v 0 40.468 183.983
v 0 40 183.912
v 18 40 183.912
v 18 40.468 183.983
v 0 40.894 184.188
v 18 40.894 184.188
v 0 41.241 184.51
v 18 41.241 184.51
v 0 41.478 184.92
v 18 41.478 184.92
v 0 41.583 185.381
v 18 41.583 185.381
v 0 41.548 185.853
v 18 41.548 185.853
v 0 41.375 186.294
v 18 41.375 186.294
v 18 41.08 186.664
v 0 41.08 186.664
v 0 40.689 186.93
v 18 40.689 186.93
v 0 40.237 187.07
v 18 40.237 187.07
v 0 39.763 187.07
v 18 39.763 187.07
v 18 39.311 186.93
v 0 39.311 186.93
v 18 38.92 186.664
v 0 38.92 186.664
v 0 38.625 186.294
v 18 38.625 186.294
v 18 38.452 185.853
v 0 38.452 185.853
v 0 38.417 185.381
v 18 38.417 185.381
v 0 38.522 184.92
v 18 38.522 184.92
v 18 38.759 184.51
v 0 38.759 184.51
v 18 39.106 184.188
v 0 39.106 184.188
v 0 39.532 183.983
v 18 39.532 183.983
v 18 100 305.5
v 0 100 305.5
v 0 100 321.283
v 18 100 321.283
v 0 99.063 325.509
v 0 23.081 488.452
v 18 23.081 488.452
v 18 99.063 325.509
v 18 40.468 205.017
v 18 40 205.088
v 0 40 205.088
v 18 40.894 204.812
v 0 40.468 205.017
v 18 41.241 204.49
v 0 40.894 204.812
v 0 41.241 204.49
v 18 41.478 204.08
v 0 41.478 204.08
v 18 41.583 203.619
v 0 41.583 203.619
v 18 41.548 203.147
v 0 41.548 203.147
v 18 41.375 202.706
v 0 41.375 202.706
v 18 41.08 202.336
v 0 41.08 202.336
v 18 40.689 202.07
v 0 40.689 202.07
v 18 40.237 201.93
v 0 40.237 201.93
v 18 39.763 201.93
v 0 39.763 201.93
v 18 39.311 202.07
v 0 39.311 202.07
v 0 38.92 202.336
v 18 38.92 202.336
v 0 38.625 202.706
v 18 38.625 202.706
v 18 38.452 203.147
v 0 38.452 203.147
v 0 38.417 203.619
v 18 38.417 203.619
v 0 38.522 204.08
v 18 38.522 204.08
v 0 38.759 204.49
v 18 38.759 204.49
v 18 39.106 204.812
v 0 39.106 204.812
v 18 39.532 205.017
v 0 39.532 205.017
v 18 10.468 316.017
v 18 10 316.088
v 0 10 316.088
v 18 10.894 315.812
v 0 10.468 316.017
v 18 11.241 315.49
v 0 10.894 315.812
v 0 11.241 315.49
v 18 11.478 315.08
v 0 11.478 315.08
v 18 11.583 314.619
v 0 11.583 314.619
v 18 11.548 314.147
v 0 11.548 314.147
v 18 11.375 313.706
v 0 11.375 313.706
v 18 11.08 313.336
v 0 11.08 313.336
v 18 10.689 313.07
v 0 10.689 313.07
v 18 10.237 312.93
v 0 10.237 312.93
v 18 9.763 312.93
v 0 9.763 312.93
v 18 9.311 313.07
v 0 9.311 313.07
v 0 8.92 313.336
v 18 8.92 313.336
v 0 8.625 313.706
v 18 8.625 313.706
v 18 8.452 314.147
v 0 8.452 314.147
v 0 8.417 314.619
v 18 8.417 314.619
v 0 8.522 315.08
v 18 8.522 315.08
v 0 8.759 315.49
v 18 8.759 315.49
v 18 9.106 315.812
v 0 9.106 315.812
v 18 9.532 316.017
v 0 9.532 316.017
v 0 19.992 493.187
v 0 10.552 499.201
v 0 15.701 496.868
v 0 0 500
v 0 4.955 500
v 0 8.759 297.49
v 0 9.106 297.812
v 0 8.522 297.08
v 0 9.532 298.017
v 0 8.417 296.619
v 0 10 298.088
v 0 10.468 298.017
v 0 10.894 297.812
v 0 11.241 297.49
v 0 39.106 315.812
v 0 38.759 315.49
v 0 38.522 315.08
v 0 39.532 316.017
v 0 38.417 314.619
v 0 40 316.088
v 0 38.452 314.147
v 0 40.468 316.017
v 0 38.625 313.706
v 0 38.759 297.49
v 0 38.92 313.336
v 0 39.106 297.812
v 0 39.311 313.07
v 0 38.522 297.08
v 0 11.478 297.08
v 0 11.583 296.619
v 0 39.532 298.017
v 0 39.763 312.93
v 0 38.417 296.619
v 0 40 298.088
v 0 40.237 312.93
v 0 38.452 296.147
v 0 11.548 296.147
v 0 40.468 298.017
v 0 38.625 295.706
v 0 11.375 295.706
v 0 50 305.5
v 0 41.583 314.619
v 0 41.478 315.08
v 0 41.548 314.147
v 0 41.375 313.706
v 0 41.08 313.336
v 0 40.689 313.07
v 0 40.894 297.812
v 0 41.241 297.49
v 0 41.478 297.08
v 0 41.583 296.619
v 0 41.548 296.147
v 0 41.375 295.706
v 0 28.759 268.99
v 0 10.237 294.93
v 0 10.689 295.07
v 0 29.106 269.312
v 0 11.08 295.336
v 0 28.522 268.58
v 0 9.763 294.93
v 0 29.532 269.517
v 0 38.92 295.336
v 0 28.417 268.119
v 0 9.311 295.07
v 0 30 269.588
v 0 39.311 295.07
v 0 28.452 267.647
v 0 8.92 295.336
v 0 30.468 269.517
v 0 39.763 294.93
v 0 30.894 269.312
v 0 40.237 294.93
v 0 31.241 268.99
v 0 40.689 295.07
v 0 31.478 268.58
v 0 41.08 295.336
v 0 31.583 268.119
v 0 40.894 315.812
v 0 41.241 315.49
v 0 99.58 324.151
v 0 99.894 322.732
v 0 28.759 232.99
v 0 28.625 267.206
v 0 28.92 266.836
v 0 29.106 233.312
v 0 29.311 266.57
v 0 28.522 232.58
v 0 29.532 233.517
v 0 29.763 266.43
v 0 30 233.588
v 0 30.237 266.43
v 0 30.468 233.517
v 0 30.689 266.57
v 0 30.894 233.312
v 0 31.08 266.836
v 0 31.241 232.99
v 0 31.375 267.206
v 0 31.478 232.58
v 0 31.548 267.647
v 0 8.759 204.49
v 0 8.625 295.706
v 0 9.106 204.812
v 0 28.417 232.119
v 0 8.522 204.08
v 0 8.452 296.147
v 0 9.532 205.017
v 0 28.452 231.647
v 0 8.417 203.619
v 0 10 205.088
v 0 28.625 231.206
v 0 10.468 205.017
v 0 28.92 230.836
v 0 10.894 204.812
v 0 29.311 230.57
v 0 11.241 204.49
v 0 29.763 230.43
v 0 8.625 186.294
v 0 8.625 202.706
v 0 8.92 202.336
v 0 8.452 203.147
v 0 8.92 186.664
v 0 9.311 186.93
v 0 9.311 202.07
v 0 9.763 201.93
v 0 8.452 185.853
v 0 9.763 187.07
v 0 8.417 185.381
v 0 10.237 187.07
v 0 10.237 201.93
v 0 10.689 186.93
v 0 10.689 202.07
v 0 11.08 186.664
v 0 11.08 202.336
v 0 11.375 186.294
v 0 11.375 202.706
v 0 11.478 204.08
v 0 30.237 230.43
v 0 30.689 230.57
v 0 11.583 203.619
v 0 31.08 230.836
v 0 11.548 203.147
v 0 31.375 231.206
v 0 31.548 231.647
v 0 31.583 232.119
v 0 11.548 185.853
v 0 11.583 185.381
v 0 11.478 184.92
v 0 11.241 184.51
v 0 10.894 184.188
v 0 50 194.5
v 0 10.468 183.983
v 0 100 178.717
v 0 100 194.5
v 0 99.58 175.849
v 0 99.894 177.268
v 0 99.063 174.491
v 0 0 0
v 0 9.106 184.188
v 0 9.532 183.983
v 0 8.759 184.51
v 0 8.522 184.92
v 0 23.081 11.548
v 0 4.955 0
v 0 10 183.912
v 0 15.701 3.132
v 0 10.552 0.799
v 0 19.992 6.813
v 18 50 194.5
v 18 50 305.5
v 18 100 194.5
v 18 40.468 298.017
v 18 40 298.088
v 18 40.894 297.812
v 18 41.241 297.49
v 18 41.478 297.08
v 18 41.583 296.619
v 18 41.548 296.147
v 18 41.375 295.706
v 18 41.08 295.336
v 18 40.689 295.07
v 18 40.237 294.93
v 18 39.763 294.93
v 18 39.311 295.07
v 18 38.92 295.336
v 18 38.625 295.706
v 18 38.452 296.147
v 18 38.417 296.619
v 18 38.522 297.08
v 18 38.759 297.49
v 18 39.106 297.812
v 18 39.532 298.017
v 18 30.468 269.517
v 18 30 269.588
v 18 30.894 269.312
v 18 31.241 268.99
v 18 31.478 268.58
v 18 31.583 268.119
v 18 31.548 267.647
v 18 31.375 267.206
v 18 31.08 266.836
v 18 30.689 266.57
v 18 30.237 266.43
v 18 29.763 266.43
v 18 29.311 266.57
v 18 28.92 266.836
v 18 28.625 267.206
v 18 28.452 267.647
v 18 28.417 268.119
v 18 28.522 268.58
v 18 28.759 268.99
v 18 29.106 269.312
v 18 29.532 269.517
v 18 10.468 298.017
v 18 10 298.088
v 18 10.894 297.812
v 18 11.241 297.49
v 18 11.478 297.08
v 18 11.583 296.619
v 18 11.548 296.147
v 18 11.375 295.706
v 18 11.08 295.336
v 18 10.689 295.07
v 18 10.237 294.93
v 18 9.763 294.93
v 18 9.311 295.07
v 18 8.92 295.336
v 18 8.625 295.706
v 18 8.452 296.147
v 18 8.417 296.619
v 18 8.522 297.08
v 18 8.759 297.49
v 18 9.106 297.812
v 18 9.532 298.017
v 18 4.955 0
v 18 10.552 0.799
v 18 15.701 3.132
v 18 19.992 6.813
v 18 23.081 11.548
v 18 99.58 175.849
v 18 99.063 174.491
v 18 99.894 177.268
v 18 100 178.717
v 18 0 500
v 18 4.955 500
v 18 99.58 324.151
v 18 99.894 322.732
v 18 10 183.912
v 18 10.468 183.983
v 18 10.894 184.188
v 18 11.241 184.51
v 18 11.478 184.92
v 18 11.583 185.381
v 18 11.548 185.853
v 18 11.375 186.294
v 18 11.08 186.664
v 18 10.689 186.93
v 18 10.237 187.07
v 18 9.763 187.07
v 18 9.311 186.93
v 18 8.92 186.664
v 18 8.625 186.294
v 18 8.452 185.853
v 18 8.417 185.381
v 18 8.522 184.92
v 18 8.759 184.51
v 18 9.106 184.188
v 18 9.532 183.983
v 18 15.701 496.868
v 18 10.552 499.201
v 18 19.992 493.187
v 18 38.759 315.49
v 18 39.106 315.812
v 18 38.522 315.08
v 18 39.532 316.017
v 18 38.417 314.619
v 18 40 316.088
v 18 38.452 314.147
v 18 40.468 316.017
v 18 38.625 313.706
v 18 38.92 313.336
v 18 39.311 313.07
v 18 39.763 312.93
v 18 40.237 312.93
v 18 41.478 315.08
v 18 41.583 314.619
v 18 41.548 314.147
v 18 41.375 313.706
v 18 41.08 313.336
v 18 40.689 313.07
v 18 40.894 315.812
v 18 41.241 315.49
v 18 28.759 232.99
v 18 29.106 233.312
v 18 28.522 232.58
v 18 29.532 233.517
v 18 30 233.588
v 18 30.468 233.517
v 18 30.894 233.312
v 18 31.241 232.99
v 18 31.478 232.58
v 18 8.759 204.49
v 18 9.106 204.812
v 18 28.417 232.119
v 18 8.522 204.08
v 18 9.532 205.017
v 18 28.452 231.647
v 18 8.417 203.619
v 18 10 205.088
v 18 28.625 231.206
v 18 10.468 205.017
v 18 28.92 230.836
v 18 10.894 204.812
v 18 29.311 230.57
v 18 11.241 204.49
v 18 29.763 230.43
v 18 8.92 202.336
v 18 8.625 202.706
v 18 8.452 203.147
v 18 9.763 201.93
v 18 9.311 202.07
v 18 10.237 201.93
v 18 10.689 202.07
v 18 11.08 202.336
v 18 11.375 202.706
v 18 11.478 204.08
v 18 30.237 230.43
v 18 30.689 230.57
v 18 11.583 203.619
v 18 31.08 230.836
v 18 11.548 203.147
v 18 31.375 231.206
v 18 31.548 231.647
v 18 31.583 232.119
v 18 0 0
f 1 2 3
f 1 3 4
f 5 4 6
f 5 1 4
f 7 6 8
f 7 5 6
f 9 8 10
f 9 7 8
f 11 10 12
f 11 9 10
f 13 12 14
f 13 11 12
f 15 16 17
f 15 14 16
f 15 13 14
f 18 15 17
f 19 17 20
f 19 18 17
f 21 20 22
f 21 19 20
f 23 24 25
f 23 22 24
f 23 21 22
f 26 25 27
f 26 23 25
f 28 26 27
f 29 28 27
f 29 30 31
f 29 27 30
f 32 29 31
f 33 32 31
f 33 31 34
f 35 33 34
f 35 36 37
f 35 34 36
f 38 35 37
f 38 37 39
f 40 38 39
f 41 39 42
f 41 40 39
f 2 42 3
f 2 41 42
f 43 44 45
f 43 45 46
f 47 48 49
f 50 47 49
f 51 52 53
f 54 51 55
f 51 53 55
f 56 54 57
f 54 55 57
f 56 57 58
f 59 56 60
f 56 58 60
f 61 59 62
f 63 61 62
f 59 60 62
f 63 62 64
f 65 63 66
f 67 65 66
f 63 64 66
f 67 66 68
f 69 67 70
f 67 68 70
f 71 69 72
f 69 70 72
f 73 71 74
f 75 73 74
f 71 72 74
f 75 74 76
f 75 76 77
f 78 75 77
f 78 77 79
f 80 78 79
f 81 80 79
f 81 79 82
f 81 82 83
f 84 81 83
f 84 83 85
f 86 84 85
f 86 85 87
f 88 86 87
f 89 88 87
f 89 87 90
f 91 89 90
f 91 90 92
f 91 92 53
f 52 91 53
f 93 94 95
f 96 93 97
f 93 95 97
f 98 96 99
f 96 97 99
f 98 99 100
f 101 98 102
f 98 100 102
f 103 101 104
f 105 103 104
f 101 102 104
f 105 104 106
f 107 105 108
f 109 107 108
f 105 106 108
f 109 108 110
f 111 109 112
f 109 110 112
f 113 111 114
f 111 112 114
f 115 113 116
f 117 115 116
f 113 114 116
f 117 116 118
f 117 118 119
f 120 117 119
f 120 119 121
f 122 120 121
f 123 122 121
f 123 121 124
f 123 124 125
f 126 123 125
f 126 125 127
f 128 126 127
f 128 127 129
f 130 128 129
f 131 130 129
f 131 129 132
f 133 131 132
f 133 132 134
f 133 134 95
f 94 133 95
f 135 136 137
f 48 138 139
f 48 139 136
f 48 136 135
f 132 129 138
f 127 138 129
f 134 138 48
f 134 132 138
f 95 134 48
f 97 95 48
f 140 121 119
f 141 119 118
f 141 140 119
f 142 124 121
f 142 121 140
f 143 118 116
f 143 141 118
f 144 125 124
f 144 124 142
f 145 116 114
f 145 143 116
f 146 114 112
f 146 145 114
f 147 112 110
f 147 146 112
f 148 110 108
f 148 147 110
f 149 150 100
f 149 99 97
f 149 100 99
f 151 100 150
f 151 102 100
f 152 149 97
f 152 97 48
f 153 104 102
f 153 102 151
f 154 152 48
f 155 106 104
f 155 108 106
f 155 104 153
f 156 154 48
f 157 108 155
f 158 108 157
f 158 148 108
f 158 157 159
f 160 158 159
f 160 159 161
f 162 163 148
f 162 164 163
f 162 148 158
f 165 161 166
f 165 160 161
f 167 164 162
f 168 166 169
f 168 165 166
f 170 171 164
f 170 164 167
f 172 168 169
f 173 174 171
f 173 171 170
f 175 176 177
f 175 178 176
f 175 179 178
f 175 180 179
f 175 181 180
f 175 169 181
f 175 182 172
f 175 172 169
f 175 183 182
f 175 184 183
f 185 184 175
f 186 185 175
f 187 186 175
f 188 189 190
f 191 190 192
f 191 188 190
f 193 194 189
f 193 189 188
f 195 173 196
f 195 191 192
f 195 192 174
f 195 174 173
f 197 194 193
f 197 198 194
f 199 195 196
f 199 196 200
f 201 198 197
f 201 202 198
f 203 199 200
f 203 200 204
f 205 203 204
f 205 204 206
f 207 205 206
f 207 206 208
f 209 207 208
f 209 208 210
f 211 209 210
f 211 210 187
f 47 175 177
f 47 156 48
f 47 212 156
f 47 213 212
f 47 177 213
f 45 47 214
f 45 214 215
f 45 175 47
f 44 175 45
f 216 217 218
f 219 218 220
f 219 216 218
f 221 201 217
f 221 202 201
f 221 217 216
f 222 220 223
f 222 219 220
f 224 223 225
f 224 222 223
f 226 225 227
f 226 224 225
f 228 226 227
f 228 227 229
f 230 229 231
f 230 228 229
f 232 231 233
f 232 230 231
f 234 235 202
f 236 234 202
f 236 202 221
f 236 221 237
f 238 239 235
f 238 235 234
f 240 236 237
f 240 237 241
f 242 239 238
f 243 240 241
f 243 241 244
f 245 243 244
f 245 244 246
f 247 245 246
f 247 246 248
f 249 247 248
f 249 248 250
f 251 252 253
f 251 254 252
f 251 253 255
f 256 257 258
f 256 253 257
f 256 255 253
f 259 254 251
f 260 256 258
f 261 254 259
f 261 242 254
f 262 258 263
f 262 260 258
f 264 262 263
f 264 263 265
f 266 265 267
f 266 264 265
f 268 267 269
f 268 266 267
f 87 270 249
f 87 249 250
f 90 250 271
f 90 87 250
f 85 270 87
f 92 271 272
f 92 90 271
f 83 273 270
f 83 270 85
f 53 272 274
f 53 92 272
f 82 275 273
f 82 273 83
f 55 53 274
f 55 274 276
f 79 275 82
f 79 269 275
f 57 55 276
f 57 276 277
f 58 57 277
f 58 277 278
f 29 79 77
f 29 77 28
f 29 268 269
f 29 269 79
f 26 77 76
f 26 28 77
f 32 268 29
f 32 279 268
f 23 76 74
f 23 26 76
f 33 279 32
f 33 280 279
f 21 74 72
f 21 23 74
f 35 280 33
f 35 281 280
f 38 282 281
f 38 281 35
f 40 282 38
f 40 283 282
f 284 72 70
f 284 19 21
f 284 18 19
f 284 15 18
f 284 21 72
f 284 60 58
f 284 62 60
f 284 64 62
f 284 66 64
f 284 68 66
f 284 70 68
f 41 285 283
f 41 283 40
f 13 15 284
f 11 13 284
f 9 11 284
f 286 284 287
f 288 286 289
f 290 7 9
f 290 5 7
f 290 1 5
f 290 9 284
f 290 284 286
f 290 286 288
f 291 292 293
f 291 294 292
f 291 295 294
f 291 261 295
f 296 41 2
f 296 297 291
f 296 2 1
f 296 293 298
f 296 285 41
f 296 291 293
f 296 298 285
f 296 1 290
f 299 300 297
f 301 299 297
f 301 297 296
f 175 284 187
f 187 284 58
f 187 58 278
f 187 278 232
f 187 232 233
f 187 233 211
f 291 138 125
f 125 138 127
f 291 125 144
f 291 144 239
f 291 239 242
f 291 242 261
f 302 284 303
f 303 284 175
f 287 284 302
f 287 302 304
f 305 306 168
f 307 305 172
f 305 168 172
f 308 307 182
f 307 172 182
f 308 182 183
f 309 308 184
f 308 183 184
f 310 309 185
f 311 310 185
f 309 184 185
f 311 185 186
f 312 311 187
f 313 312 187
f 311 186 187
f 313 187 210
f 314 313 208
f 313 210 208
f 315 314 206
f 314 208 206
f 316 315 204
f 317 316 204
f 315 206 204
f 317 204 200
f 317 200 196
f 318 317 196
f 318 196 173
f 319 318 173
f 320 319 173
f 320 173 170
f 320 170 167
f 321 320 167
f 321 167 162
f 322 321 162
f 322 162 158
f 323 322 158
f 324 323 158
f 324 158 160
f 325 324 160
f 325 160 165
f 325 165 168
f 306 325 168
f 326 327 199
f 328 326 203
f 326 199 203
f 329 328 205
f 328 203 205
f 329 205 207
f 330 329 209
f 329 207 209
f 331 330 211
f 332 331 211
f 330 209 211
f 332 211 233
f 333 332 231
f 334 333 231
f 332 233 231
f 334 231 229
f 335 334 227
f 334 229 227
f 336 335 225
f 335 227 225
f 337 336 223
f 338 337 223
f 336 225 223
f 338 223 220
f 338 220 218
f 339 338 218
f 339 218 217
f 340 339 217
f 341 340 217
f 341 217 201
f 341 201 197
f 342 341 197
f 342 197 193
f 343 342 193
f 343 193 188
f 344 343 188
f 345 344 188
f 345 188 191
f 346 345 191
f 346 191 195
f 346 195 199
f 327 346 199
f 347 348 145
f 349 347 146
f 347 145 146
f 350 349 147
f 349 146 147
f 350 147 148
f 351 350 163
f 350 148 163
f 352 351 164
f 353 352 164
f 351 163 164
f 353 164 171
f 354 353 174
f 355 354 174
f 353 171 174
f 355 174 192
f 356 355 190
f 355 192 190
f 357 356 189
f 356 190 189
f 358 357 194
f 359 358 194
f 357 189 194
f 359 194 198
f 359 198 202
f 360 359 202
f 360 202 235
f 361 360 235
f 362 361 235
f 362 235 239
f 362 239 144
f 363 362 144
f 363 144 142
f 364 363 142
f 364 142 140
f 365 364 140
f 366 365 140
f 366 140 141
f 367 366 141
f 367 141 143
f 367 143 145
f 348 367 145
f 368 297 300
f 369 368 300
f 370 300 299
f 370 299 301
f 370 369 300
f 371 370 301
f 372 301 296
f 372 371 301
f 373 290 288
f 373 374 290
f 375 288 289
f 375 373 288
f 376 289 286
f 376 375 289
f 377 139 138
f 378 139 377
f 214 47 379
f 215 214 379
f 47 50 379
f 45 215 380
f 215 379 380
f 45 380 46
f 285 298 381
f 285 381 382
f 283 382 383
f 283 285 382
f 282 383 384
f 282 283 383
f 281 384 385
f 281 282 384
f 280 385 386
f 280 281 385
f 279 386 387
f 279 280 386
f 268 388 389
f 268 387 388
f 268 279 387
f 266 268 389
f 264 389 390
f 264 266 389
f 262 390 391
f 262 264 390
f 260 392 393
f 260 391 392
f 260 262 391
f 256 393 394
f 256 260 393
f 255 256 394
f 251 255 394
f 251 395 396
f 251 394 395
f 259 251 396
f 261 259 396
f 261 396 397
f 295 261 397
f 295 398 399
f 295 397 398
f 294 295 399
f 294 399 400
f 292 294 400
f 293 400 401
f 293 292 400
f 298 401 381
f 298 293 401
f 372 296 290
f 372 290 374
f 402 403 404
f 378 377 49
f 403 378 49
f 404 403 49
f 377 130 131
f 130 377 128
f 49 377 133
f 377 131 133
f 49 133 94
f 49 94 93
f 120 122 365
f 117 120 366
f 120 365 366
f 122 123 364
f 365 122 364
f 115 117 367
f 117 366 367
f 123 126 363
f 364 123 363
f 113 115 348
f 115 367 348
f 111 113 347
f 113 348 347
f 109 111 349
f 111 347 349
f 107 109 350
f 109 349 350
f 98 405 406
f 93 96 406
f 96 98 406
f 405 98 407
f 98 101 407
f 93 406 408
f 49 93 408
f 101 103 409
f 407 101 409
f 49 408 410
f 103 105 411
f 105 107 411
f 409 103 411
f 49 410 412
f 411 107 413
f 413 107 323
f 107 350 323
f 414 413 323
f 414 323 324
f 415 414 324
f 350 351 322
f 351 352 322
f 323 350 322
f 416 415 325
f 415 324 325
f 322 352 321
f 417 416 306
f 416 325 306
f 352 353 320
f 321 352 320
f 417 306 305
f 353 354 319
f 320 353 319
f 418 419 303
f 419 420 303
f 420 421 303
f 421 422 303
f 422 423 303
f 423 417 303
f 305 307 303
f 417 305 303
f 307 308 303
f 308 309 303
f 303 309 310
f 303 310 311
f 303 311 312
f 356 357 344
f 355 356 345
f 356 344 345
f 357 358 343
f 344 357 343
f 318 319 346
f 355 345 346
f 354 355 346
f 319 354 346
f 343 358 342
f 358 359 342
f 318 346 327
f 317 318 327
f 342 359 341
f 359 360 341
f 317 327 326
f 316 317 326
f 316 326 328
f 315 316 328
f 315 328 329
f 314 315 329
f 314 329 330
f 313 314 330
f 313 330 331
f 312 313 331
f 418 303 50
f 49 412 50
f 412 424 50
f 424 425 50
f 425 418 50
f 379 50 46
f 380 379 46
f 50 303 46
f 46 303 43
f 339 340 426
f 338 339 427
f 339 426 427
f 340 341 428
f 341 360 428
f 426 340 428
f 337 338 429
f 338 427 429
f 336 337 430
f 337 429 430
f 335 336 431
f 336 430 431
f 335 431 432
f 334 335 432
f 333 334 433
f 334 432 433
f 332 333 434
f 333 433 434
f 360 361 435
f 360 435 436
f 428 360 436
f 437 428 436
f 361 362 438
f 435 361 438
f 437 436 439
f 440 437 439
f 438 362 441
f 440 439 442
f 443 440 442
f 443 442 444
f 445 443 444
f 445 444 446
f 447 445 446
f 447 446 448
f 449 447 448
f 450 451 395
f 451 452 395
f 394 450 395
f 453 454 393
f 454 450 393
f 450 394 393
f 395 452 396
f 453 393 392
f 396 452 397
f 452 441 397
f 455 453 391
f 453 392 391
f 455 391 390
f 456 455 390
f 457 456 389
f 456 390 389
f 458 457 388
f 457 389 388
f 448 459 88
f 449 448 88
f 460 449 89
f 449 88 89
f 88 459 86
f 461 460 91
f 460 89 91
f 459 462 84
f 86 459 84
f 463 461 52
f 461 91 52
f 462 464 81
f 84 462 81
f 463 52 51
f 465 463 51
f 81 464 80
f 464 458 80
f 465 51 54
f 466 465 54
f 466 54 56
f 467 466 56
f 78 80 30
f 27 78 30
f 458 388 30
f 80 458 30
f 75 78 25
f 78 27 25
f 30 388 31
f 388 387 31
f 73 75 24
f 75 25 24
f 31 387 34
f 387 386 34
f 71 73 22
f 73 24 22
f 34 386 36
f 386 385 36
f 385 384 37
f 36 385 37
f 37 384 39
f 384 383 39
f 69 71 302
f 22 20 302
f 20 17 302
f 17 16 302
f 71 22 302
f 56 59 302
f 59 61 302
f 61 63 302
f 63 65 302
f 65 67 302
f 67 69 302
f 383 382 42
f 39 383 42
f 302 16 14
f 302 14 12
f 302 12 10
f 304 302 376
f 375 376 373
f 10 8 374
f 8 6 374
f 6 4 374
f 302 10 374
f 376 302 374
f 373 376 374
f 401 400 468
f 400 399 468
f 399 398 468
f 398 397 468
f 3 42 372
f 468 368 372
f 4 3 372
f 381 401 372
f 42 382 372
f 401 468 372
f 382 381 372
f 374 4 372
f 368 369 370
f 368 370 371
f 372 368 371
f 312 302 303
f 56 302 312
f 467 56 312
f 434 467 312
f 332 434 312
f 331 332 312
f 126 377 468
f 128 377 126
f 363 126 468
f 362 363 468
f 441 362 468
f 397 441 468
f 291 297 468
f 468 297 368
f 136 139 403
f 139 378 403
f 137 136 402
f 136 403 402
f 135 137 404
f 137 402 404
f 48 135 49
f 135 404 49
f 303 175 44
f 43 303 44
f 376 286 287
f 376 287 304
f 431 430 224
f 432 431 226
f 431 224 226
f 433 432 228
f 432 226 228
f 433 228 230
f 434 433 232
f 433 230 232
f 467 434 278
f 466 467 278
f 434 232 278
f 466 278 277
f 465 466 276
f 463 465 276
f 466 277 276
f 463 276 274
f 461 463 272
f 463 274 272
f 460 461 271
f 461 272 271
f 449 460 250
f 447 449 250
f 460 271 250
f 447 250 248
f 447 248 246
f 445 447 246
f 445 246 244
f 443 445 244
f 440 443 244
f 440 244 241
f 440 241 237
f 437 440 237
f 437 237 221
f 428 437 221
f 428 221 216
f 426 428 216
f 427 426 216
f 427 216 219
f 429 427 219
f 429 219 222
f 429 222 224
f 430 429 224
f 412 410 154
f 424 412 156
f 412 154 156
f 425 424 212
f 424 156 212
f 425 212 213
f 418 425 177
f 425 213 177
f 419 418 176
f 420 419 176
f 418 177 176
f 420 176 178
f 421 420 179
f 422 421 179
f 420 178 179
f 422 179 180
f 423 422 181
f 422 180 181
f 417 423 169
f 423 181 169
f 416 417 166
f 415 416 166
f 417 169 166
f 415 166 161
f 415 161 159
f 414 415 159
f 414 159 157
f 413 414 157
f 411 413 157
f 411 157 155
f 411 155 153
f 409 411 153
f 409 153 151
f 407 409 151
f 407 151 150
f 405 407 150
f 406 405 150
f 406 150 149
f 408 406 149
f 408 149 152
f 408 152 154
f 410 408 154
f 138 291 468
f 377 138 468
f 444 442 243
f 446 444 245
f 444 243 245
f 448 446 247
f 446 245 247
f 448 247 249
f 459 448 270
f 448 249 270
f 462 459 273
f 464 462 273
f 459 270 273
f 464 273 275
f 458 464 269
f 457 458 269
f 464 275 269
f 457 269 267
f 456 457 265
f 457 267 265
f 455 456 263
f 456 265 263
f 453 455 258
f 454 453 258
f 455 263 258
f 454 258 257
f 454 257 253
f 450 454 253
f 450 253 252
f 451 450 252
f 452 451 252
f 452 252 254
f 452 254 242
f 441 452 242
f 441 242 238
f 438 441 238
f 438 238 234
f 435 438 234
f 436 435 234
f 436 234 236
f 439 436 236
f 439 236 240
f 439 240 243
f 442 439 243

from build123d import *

# Parameters (mm, degrees)
SKETCH1_W                                  = 18
SKETCH1_H                                  = 100
BASE_DEPTH                                 = 500
SKETCH2_W                                  = 111
SKETCH2_H                                  = 50
LAP_JOINT_CUTOUT_DEPTH                     = 511.219560582
LAP_JOINT_BOLT_HOLE_PATTERN_D              = 3.175
CHAMFER_FRONT_SIZE                         = 176.5
CHAMFER_FRONT_SIZE2                        = 82.303301664
CHAMFER_REAR_SIZE                          = 176.5
CHAMFER_REAR_SIZE2                         = 82.303301664
BREAK_CHAMFER_OUTER_CORNERS_R              = 20
CROSS_TIE_BOLT_HOLE_PATTERN_D              = 3.175
FILLET1_R                                  = 10
FLOATING_BEARING_BLOCK_BOLT_HOLE_PATTERN_D = 3.175


with BuildPart() as part:
    # Sketch1 → base (new body)
    with BuildSketch(Plane.XY):
        with Locations((9, 50)):
            Rectangle(SKETCH1_W, SKETCH1_H)
    extrude(amount=BASE_DEPTH)

    # Sketch2 → lap joint cutout (cut, through all)
    with BuildSketch(Plane.ZY):
        with Locations((250, 75)):
            Rectangle(SKETCH2_W, SKETCH2_H)
    extrude(amount=-LAP_JOINT_CUTOUT_DEPTH, mode=Mode.SUBTRACT)

    # lap joint bolt hole pattern (through all)
    with Locations(Plane(origin=(18, 0, 0), x_dir=(0, 0, -1), z_dir=(1, 0, 0))):
        with Locations((-296.5, 40), (-203.5, 10), (-296.5, 10), (-203.5, 40)):
            Hole(LAP_JOINT_BOLT_HOLE_PATTERN_D / 2)

    # chamfer front
    chamfer_front_edges = [part.edges().sort_by_distance(p)[0] for p in [
        (9, 100, 0),
    ]]
    chamfer_front_side = [part.faces().sort_by_distance(p)[0] for p in [
        (9, 100, 97.25),
    ]]
    chamfer(chamfer_front_edges, length=CHAMFER_FRONT_SIZE, length2=CHAMFER_FRONT_SIZE2, reference=chamfer_front_side[0])

    # chamfer rear
    chamfer_rear_edges = [part.edges().sort_by_distance(p)[0] for p in [
        (9, 100, 500),
    ]]
    chamfer_rear_side = [part.faces().sort_by_distance(p)[0] for p in [
        (9, 100, 402.75),
    ]]
    chamfer(chamfer_rear_edges, length=CHAMFER_REAR_SIZE, length2=CHAMFER_REAR_SIZE2, reference=chamfer_rear_side[0])

    # break chamfer outer corners
    break_chamfer_outer_corners_edges = [part.edges().sort_by_distance(p)[0] for p in [
        (9, 17.696698336, 0),
        (9, 17.696698336, 500),
    ]]
    fillet(break_chamfer_outer_corners_edges, radius=BREAK_CHAMFER_OUTER_CORNERS_R)

    # cross tie bolt hole pattern (through all)
    with Locations(Plane(origin=(18, 0, 0), x_dir=(0, 0, -1), z_dir=(1, 0, 0))):
        with Locations((-314.5, 40), (-314.5, 10)):
            cross_tie_bolt_hole_pattern = Hole(CROSS_TIE_BOLT_HOLE_PATTERN_D / 2)

    # mirror cross tie bolt hole pattern: cross tie bolt hole pattern across plane
    add(cross_tie_bolt_hole_pattern.mirror(Plane(origin=(0, 0, 250), x_dir=(1, 0, 0), z_dir=(0, 0, -1))), mode=Mode.SUBTRACT)

    # Fillet1
    fillet1_edges = [part.edges().sort_by_distance(p)[0] for p in [
        (9, 100, 176.5),
        (9, 100, 323.5),
    ]]
    fillet(fillet1_edges, radius=FILLET1_R)

    # floating bearing block bolt hole pattern (through all)
    with Locations(Plane(origin=(18, 0, 0), x_dir=(0, 0, -1), z_dir=(1, 0, 0))):
        with Locations((-268, 30), (-232, 30)):
            Hole(FLOATING_BEARING_BLOCK_BOLT_HOLE_PATTERN_D / 2)


solid = part.part
